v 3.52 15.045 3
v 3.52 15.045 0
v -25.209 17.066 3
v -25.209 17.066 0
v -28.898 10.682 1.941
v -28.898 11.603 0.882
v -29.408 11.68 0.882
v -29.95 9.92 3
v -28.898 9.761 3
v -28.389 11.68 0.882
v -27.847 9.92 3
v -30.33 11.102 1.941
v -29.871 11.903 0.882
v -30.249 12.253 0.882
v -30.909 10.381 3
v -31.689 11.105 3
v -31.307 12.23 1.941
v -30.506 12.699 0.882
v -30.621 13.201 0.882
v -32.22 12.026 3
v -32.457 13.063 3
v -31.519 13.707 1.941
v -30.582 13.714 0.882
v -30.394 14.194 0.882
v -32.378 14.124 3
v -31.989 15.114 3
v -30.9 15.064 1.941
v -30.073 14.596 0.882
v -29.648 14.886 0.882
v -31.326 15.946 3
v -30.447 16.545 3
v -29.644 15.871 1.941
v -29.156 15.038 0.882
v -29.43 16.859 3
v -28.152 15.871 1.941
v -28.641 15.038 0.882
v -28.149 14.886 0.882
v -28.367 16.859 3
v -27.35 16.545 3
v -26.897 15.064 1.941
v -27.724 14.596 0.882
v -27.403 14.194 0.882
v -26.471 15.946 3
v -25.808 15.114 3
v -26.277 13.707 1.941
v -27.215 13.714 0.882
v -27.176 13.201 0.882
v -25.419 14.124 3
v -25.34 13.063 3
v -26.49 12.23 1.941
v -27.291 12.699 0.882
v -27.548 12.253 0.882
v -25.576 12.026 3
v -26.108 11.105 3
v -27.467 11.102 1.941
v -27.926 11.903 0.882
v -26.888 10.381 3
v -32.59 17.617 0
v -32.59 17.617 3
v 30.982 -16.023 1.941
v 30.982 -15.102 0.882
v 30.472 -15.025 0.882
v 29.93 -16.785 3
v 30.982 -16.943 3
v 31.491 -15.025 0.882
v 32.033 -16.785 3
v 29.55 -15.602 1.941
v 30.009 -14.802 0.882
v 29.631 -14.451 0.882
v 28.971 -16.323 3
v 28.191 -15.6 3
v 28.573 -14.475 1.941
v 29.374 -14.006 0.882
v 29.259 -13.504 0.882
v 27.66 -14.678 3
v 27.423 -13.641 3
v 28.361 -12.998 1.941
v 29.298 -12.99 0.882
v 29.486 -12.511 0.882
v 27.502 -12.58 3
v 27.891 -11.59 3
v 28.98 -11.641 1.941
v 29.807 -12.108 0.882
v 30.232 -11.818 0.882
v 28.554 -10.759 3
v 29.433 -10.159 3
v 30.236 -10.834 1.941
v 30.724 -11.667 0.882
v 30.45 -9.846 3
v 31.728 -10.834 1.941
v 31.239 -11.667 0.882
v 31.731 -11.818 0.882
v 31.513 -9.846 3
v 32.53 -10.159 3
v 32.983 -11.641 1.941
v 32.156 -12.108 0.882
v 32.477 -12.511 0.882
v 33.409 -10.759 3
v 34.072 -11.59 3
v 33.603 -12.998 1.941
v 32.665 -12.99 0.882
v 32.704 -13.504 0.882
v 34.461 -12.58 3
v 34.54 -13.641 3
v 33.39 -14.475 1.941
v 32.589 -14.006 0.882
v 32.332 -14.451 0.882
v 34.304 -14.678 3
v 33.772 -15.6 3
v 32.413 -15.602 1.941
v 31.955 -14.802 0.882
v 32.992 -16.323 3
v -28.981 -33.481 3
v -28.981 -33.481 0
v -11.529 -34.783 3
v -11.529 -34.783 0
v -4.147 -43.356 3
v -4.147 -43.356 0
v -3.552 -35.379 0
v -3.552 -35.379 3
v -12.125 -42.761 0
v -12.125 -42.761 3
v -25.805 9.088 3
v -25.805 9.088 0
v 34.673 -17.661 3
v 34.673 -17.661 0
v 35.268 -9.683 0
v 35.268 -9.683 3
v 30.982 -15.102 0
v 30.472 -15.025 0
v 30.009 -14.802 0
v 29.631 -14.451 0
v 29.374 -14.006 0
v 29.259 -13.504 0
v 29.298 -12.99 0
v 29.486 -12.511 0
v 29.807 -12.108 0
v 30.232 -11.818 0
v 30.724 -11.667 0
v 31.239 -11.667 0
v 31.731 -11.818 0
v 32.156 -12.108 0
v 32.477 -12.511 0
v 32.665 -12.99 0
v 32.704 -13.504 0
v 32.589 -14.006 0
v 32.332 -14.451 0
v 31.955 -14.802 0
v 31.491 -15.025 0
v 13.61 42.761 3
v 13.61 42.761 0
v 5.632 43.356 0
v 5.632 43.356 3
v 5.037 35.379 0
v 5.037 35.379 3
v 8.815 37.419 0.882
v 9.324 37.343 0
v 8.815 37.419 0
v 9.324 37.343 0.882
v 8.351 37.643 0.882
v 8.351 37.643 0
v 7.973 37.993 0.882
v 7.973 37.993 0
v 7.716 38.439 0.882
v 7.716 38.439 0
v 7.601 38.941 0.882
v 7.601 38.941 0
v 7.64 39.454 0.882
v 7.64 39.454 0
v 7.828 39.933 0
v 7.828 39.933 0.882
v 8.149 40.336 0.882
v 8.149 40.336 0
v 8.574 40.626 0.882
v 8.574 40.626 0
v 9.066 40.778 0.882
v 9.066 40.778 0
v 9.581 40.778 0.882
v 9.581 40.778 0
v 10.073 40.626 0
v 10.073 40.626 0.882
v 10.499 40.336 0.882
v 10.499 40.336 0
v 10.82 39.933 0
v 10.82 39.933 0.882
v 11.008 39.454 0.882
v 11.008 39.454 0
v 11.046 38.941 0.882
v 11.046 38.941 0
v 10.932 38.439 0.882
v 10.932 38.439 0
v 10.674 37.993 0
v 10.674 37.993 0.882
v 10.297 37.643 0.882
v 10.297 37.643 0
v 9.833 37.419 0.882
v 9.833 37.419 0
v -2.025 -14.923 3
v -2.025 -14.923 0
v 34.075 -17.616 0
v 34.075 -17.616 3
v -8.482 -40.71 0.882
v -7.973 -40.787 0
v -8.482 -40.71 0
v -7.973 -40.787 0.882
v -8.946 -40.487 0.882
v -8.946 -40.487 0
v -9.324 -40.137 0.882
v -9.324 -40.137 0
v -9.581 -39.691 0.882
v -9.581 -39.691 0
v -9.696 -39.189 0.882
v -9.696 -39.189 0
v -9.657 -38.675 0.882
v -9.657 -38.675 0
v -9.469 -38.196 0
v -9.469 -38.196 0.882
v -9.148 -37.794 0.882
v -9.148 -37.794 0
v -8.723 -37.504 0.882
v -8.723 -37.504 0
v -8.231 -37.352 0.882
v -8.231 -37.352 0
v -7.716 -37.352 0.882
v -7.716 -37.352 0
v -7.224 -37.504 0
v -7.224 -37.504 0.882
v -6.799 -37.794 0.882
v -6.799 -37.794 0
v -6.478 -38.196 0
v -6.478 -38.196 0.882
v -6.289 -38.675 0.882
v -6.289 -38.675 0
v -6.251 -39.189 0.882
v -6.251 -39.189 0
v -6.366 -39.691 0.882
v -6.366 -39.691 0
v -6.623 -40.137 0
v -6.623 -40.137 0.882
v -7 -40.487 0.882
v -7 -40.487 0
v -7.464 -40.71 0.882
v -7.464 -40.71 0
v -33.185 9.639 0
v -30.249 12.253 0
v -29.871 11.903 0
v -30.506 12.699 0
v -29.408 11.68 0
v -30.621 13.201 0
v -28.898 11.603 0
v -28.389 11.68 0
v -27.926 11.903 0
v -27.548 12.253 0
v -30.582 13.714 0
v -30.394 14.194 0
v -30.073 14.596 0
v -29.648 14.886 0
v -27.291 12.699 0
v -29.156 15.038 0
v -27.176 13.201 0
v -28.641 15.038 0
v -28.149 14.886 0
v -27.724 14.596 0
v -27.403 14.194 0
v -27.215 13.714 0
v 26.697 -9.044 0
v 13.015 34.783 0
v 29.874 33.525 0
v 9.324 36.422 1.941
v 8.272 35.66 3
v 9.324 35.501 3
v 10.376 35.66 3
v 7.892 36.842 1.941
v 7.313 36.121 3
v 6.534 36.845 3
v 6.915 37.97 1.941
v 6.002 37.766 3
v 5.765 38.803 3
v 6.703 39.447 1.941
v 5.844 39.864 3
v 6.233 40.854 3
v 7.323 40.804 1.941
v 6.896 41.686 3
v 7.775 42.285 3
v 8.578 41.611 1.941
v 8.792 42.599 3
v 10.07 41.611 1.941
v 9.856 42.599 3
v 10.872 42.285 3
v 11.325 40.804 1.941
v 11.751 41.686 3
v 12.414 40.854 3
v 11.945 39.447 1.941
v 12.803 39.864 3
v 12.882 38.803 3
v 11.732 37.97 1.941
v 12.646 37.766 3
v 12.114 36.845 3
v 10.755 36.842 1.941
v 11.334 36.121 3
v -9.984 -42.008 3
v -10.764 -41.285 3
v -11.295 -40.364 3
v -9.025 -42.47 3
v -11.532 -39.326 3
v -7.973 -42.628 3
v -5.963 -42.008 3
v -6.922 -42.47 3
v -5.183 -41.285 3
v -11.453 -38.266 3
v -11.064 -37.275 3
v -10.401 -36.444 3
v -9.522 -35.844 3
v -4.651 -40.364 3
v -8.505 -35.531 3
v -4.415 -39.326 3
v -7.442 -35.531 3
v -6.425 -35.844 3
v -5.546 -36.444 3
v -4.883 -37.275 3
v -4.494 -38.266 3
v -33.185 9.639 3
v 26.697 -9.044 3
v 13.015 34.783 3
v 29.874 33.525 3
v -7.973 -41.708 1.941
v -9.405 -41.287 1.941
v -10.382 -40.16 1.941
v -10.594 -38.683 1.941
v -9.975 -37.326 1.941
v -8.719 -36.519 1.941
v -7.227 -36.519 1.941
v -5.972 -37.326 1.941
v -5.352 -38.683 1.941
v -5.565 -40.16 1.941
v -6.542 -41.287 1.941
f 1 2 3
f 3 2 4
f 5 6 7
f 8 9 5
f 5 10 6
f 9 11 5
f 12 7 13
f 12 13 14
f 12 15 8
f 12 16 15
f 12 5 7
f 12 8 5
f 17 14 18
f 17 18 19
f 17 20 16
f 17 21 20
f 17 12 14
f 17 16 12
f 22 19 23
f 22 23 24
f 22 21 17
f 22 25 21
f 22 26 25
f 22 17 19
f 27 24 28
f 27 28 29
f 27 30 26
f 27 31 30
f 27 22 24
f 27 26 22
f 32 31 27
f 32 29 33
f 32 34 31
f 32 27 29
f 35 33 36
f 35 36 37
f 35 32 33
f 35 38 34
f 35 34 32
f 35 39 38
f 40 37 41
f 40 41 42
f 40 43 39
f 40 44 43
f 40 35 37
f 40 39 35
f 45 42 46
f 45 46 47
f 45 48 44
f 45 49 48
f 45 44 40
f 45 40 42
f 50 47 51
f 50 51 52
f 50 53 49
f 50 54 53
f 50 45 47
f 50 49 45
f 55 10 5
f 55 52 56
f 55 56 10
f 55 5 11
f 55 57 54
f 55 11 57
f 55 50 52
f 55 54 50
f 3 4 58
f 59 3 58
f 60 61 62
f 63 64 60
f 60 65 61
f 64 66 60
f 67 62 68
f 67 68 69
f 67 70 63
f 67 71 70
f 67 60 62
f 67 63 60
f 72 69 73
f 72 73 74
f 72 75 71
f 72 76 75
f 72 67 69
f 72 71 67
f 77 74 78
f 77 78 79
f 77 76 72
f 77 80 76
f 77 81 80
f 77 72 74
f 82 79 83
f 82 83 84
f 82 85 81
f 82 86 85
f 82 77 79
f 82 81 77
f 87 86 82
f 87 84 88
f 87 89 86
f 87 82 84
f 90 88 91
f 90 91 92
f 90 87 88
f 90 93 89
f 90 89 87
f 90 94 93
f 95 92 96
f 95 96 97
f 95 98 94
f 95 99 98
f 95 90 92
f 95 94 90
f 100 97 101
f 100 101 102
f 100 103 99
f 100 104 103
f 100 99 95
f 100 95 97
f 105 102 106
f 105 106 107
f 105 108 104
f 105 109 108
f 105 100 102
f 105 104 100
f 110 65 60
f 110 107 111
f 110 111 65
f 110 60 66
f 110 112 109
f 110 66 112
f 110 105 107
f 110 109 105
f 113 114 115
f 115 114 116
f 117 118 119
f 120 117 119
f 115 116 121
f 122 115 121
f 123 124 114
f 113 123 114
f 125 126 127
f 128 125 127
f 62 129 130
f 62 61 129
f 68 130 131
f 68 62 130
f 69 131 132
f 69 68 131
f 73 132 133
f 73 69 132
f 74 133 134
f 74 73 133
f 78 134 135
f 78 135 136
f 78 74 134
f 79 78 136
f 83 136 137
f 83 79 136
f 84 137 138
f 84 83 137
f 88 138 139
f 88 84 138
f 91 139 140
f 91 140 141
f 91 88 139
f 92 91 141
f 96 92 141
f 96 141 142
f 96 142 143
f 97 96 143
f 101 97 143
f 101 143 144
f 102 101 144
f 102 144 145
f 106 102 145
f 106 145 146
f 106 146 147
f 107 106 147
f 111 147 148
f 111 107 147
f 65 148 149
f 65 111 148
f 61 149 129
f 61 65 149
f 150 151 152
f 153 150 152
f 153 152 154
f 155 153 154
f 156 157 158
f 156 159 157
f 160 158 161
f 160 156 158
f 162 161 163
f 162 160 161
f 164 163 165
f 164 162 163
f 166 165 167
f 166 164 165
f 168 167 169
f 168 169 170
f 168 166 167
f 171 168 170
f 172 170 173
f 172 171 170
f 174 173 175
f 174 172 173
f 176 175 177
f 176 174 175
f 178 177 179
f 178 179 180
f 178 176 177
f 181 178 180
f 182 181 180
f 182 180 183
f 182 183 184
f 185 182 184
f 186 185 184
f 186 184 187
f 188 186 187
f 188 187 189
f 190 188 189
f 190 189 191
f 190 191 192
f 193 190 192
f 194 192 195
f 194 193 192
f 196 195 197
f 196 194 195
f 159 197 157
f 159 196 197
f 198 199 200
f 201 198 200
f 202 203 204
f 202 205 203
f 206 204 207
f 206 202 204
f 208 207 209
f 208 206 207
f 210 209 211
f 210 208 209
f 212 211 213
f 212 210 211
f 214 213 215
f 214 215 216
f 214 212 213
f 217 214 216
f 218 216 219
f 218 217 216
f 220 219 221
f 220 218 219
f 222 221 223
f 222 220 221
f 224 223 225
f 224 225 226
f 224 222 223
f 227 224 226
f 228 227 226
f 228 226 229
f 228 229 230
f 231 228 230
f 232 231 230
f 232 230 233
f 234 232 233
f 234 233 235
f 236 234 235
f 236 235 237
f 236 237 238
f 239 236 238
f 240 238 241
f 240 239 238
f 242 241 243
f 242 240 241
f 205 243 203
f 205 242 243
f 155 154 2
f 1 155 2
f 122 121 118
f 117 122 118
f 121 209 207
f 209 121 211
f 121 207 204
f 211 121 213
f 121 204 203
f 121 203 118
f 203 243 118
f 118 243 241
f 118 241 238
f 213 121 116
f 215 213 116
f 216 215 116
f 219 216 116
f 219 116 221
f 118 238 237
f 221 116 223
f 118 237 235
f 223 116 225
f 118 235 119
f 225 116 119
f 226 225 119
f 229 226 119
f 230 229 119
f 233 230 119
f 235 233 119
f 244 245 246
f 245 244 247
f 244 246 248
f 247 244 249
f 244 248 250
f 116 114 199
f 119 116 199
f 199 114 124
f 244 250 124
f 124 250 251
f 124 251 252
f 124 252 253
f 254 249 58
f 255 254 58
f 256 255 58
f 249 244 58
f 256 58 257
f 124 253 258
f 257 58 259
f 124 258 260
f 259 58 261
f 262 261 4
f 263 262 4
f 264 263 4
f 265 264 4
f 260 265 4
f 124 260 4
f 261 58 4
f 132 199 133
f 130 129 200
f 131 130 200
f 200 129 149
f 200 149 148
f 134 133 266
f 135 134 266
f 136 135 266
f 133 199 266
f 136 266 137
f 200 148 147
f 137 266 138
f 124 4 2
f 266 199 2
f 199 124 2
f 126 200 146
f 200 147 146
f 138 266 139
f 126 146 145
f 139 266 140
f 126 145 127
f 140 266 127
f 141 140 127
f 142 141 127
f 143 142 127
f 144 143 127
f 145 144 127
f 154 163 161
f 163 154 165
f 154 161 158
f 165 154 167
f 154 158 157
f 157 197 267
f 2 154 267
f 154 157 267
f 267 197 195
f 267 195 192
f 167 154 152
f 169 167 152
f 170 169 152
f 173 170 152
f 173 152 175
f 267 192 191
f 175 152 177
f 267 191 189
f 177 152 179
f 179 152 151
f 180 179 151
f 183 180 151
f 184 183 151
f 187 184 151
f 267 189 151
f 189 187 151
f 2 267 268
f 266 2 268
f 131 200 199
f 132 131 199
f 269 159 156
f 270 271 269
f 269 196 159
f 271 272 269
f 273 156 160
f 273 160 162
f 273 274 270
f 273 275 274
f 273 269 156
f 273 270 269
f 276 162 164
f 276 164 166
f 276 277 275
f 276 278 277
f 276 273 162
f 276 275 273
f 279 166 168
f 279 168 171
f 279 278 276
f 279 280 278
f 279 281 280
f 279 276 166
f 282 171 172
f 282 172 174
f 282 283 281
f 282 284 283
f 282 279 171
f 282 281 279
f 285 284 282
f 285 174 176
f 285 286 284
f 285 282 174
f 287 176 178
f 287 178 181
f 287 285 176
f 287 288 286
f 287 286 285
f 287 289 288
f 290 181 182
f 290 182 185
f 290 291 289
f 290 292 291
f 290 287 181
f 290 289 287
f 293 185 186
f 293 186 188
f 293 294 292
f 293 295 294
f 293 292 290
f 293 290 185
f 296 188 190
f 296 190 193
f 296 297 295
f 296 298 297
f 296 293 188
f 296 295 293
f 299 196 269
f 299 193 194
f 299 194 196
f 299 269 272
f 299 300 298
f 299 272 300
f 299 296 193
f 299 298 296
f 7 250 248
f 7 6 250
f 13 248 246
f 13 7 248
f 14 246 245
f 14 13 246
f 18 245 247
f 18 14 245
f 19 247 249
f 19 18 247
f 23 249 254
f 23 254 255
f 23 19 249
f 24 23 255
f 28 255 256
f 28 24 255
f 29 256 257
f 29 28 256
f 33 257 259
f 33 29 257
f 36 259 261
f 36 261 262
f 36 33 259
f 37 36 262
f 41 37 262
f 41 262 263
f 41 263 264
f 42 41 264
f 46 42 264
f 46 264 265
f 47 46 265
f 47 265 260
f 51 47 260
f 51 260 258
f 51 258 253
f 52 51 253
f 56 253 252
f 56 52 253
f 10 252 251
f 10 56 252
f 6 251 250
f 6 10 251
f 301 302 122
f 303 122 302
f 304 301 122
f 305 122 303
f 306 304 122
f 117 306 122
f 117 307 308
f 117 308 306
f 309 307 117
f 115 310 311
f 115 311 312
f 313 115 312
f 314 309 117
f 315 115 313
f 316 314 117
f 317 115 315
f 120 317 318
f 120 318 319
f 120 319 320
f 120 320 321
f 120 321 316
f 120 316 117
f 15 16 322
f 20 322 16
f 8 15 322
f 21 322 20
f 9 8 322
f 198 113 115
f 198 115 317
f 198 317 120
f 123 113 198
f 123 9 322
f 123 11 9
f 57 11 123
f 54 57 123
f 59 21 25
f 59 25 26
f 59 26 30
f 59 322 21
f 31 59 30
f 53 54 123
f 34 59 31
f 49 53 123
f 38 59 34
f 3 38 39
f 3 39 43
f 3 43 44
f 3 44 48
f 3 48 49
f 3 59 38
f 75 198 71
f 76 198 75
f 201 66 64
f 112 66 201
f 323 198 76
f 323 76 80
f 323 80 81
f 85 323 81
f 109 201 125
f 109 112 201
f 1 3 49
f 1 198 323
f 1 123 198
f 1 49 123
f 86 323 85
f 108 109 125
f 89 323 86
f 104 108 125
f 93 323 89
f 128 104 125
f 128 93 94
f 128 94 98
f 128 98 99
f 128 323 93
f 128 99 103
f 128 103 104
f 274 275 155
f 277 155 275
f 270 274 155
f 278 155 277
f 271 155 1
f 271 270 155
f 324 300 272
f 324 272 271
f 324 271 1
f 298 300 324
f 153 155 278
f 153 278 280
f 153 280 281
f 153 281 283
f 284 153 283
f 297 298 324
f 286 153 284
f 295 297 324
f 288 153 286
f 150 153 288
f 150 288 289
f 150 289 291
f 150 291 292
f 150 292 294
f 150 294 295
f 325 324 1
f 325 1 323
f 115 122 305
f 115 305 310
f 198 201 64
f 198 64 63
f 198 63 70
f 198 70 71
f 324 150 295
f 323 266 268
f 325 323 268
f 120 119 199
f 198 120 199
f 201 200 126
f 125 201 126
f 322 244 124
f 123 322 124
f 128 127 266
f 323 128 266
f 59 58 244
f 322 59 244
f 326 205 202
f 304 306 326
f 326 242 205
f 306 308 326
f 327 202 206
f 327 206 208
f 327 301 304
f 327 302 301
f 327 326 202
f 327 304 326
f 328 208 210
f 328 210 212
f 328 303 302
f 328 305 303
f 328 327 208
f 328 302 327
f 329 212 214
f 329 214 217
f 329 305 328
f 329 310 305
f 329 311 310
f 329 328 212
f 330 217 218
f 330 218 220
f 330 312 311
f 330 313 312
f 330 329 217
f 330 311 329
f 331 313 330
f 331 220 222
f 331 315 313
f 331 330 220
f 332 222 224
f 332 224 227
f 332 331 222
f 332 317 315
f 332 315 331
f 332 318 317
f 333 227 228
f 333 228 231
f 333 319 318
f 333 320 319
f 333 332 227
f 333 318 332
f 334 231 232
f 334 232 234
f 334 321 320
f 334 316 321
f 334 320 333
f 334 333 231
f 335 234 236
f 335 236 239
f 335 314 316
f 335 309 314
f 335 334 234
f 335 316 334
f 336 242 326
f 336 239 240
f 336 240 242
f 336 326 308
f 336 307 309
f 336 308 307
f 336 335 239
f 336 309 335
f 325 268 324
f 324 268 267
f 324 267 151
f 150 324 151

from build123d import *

# Parameters (mm, degrees)
BOSS_EXTRUDE1_DEPTH                           = 3
CSK_FOR_5_FLAT_HEAD_SOCKET_CAP_SCREW1_A_COUNT = 2
CSK_FOR_5_FLAT_HEAD_SOCKET_CAP_SCREW1_A_PITCH = 56.41402705
CSK_FOR_5_FLAT_HEAD_SOCKET_CAP_SCRE_2_COUNT   = 2
CSK_FOR_5_FLAT_HEAD_SOCKET_CAP_SCRE_2_PITCH   = 80.02134109
CSK_FOR_5_FLAT_HEAD_SOCKET_CAP_SCRE_3_COUNT   = 2
CSK_FOR_5_FLAT_HEAD_SOCKET_CAP_SCRE_3_PITCH   = 46.660638534


with BuildPart() as part:
    # Sketch1 → Boss-Extrude1 (new body)
    with BuildSketch(Plane.XY):
        Polygon((-25.209392257, 17.065862145), (-32.589765844, 17.616547994), (-33.185013977, 9.638724086), (-25.804640414, 9.088037903), (-28.980934475, -33.481127138), (-11.529359642, -34.783274677), (-12.124624122, -42.761097701), (-4.146801098, -43.356362181), (-3.551536618, -35.378539157), (-2.025288651, -14.922973048), (34.074511236, -17.616481792), (34.672848055, -17.661125404), (35.268112443, -9.683303605), (26.697352489, -9.043797194), (29.87364655, 33.525367847), (13.014992274, 34.783274677), (13.610256754, 42.761097701), (5.63243373, 43.356362181), (5.03716925, 35.378539157), (3.51996828, 15.044798681), align=None)
    extrude(amount=BOSS_EXTRUDE1_DEPTH)

    # Sketch2 → CSK for #5 Flat Head Socket Cap Screw1 (revolve, cut)
    with BuildSketch(Plane(origin=(-7.973395272, -39.059721921, 3), x_dir=(0, -1, 0), z_dir=(1, 0, 0))):
        Polygon((0, 0), (0, 3), (1.7272, 3), (1.7272, 2.118403422), (3.5687, 0), align=None)
    csk_for_5_flat_head_socket_cap_screw1 = revolve(axis=Axis((-7.973395272, -39.059721921, 9.35), (0, 0, -1)), mode=Mode.SUBTRACT)

    # CSK for #5 Flat Head Socket Cap Screw1 a: CSK for #5 Flat Head Socket Cap Screw1 ×2
    with Locations(*[Vector(-0.370919862, 0.928664878, 0) * (i * CSK_FOR_5_FLAT_HEAD_SOCKET_CAP_SCREW1_A_PITCH) for i in range(1, CSK_FOR_5_FLAT_HEAD_SOCKET_CAP_SCREW1_A_COUNT)]):
        add(csk_for_5_flat_head_socket_cap_screw1, mode=Mode.SUBTRACT)

    # CSK for _5 Flat Head Socket Cap Scre 2: CSK for #5 Flat Head Socket Cap Screw1 ×2
    with Locations(*[Vector(0.216156191, 0.976358797, 0) * (i * CSK_FOR_5_FLAT_HEAD_SOCKET_CAP_SCRE_2_PITCH) for i in range(1, CSK_FOR_5_FLAT_HEAD_SOCKET_CAP_SCRE_2_COUNT)]):
        add(csk_for_5_flat_head_socket_cap_screw1, mode=Mode.SUBTRACT)

    # CSK for _5 Flat Head Socket Cap Scre 3: CSK for #5 Flat Head Socket Cap Screw1 ×2
    with Locations(*[Vector(0.834857059, 0.550466794, 0) * (i * CSK_FOR_5_FLAT_HEAD_SOCKET_CAP_SCRE_3_PITCH) for i in range(1, CSK_FOR_5_FLAT_HEAD_SOCKET_CAP_SCRE_3_COUNT)]):
        add(csk_for_5_flat_head_socket_cap_screw1, mode=Mode.SUBTRACT)


solid = part.part
